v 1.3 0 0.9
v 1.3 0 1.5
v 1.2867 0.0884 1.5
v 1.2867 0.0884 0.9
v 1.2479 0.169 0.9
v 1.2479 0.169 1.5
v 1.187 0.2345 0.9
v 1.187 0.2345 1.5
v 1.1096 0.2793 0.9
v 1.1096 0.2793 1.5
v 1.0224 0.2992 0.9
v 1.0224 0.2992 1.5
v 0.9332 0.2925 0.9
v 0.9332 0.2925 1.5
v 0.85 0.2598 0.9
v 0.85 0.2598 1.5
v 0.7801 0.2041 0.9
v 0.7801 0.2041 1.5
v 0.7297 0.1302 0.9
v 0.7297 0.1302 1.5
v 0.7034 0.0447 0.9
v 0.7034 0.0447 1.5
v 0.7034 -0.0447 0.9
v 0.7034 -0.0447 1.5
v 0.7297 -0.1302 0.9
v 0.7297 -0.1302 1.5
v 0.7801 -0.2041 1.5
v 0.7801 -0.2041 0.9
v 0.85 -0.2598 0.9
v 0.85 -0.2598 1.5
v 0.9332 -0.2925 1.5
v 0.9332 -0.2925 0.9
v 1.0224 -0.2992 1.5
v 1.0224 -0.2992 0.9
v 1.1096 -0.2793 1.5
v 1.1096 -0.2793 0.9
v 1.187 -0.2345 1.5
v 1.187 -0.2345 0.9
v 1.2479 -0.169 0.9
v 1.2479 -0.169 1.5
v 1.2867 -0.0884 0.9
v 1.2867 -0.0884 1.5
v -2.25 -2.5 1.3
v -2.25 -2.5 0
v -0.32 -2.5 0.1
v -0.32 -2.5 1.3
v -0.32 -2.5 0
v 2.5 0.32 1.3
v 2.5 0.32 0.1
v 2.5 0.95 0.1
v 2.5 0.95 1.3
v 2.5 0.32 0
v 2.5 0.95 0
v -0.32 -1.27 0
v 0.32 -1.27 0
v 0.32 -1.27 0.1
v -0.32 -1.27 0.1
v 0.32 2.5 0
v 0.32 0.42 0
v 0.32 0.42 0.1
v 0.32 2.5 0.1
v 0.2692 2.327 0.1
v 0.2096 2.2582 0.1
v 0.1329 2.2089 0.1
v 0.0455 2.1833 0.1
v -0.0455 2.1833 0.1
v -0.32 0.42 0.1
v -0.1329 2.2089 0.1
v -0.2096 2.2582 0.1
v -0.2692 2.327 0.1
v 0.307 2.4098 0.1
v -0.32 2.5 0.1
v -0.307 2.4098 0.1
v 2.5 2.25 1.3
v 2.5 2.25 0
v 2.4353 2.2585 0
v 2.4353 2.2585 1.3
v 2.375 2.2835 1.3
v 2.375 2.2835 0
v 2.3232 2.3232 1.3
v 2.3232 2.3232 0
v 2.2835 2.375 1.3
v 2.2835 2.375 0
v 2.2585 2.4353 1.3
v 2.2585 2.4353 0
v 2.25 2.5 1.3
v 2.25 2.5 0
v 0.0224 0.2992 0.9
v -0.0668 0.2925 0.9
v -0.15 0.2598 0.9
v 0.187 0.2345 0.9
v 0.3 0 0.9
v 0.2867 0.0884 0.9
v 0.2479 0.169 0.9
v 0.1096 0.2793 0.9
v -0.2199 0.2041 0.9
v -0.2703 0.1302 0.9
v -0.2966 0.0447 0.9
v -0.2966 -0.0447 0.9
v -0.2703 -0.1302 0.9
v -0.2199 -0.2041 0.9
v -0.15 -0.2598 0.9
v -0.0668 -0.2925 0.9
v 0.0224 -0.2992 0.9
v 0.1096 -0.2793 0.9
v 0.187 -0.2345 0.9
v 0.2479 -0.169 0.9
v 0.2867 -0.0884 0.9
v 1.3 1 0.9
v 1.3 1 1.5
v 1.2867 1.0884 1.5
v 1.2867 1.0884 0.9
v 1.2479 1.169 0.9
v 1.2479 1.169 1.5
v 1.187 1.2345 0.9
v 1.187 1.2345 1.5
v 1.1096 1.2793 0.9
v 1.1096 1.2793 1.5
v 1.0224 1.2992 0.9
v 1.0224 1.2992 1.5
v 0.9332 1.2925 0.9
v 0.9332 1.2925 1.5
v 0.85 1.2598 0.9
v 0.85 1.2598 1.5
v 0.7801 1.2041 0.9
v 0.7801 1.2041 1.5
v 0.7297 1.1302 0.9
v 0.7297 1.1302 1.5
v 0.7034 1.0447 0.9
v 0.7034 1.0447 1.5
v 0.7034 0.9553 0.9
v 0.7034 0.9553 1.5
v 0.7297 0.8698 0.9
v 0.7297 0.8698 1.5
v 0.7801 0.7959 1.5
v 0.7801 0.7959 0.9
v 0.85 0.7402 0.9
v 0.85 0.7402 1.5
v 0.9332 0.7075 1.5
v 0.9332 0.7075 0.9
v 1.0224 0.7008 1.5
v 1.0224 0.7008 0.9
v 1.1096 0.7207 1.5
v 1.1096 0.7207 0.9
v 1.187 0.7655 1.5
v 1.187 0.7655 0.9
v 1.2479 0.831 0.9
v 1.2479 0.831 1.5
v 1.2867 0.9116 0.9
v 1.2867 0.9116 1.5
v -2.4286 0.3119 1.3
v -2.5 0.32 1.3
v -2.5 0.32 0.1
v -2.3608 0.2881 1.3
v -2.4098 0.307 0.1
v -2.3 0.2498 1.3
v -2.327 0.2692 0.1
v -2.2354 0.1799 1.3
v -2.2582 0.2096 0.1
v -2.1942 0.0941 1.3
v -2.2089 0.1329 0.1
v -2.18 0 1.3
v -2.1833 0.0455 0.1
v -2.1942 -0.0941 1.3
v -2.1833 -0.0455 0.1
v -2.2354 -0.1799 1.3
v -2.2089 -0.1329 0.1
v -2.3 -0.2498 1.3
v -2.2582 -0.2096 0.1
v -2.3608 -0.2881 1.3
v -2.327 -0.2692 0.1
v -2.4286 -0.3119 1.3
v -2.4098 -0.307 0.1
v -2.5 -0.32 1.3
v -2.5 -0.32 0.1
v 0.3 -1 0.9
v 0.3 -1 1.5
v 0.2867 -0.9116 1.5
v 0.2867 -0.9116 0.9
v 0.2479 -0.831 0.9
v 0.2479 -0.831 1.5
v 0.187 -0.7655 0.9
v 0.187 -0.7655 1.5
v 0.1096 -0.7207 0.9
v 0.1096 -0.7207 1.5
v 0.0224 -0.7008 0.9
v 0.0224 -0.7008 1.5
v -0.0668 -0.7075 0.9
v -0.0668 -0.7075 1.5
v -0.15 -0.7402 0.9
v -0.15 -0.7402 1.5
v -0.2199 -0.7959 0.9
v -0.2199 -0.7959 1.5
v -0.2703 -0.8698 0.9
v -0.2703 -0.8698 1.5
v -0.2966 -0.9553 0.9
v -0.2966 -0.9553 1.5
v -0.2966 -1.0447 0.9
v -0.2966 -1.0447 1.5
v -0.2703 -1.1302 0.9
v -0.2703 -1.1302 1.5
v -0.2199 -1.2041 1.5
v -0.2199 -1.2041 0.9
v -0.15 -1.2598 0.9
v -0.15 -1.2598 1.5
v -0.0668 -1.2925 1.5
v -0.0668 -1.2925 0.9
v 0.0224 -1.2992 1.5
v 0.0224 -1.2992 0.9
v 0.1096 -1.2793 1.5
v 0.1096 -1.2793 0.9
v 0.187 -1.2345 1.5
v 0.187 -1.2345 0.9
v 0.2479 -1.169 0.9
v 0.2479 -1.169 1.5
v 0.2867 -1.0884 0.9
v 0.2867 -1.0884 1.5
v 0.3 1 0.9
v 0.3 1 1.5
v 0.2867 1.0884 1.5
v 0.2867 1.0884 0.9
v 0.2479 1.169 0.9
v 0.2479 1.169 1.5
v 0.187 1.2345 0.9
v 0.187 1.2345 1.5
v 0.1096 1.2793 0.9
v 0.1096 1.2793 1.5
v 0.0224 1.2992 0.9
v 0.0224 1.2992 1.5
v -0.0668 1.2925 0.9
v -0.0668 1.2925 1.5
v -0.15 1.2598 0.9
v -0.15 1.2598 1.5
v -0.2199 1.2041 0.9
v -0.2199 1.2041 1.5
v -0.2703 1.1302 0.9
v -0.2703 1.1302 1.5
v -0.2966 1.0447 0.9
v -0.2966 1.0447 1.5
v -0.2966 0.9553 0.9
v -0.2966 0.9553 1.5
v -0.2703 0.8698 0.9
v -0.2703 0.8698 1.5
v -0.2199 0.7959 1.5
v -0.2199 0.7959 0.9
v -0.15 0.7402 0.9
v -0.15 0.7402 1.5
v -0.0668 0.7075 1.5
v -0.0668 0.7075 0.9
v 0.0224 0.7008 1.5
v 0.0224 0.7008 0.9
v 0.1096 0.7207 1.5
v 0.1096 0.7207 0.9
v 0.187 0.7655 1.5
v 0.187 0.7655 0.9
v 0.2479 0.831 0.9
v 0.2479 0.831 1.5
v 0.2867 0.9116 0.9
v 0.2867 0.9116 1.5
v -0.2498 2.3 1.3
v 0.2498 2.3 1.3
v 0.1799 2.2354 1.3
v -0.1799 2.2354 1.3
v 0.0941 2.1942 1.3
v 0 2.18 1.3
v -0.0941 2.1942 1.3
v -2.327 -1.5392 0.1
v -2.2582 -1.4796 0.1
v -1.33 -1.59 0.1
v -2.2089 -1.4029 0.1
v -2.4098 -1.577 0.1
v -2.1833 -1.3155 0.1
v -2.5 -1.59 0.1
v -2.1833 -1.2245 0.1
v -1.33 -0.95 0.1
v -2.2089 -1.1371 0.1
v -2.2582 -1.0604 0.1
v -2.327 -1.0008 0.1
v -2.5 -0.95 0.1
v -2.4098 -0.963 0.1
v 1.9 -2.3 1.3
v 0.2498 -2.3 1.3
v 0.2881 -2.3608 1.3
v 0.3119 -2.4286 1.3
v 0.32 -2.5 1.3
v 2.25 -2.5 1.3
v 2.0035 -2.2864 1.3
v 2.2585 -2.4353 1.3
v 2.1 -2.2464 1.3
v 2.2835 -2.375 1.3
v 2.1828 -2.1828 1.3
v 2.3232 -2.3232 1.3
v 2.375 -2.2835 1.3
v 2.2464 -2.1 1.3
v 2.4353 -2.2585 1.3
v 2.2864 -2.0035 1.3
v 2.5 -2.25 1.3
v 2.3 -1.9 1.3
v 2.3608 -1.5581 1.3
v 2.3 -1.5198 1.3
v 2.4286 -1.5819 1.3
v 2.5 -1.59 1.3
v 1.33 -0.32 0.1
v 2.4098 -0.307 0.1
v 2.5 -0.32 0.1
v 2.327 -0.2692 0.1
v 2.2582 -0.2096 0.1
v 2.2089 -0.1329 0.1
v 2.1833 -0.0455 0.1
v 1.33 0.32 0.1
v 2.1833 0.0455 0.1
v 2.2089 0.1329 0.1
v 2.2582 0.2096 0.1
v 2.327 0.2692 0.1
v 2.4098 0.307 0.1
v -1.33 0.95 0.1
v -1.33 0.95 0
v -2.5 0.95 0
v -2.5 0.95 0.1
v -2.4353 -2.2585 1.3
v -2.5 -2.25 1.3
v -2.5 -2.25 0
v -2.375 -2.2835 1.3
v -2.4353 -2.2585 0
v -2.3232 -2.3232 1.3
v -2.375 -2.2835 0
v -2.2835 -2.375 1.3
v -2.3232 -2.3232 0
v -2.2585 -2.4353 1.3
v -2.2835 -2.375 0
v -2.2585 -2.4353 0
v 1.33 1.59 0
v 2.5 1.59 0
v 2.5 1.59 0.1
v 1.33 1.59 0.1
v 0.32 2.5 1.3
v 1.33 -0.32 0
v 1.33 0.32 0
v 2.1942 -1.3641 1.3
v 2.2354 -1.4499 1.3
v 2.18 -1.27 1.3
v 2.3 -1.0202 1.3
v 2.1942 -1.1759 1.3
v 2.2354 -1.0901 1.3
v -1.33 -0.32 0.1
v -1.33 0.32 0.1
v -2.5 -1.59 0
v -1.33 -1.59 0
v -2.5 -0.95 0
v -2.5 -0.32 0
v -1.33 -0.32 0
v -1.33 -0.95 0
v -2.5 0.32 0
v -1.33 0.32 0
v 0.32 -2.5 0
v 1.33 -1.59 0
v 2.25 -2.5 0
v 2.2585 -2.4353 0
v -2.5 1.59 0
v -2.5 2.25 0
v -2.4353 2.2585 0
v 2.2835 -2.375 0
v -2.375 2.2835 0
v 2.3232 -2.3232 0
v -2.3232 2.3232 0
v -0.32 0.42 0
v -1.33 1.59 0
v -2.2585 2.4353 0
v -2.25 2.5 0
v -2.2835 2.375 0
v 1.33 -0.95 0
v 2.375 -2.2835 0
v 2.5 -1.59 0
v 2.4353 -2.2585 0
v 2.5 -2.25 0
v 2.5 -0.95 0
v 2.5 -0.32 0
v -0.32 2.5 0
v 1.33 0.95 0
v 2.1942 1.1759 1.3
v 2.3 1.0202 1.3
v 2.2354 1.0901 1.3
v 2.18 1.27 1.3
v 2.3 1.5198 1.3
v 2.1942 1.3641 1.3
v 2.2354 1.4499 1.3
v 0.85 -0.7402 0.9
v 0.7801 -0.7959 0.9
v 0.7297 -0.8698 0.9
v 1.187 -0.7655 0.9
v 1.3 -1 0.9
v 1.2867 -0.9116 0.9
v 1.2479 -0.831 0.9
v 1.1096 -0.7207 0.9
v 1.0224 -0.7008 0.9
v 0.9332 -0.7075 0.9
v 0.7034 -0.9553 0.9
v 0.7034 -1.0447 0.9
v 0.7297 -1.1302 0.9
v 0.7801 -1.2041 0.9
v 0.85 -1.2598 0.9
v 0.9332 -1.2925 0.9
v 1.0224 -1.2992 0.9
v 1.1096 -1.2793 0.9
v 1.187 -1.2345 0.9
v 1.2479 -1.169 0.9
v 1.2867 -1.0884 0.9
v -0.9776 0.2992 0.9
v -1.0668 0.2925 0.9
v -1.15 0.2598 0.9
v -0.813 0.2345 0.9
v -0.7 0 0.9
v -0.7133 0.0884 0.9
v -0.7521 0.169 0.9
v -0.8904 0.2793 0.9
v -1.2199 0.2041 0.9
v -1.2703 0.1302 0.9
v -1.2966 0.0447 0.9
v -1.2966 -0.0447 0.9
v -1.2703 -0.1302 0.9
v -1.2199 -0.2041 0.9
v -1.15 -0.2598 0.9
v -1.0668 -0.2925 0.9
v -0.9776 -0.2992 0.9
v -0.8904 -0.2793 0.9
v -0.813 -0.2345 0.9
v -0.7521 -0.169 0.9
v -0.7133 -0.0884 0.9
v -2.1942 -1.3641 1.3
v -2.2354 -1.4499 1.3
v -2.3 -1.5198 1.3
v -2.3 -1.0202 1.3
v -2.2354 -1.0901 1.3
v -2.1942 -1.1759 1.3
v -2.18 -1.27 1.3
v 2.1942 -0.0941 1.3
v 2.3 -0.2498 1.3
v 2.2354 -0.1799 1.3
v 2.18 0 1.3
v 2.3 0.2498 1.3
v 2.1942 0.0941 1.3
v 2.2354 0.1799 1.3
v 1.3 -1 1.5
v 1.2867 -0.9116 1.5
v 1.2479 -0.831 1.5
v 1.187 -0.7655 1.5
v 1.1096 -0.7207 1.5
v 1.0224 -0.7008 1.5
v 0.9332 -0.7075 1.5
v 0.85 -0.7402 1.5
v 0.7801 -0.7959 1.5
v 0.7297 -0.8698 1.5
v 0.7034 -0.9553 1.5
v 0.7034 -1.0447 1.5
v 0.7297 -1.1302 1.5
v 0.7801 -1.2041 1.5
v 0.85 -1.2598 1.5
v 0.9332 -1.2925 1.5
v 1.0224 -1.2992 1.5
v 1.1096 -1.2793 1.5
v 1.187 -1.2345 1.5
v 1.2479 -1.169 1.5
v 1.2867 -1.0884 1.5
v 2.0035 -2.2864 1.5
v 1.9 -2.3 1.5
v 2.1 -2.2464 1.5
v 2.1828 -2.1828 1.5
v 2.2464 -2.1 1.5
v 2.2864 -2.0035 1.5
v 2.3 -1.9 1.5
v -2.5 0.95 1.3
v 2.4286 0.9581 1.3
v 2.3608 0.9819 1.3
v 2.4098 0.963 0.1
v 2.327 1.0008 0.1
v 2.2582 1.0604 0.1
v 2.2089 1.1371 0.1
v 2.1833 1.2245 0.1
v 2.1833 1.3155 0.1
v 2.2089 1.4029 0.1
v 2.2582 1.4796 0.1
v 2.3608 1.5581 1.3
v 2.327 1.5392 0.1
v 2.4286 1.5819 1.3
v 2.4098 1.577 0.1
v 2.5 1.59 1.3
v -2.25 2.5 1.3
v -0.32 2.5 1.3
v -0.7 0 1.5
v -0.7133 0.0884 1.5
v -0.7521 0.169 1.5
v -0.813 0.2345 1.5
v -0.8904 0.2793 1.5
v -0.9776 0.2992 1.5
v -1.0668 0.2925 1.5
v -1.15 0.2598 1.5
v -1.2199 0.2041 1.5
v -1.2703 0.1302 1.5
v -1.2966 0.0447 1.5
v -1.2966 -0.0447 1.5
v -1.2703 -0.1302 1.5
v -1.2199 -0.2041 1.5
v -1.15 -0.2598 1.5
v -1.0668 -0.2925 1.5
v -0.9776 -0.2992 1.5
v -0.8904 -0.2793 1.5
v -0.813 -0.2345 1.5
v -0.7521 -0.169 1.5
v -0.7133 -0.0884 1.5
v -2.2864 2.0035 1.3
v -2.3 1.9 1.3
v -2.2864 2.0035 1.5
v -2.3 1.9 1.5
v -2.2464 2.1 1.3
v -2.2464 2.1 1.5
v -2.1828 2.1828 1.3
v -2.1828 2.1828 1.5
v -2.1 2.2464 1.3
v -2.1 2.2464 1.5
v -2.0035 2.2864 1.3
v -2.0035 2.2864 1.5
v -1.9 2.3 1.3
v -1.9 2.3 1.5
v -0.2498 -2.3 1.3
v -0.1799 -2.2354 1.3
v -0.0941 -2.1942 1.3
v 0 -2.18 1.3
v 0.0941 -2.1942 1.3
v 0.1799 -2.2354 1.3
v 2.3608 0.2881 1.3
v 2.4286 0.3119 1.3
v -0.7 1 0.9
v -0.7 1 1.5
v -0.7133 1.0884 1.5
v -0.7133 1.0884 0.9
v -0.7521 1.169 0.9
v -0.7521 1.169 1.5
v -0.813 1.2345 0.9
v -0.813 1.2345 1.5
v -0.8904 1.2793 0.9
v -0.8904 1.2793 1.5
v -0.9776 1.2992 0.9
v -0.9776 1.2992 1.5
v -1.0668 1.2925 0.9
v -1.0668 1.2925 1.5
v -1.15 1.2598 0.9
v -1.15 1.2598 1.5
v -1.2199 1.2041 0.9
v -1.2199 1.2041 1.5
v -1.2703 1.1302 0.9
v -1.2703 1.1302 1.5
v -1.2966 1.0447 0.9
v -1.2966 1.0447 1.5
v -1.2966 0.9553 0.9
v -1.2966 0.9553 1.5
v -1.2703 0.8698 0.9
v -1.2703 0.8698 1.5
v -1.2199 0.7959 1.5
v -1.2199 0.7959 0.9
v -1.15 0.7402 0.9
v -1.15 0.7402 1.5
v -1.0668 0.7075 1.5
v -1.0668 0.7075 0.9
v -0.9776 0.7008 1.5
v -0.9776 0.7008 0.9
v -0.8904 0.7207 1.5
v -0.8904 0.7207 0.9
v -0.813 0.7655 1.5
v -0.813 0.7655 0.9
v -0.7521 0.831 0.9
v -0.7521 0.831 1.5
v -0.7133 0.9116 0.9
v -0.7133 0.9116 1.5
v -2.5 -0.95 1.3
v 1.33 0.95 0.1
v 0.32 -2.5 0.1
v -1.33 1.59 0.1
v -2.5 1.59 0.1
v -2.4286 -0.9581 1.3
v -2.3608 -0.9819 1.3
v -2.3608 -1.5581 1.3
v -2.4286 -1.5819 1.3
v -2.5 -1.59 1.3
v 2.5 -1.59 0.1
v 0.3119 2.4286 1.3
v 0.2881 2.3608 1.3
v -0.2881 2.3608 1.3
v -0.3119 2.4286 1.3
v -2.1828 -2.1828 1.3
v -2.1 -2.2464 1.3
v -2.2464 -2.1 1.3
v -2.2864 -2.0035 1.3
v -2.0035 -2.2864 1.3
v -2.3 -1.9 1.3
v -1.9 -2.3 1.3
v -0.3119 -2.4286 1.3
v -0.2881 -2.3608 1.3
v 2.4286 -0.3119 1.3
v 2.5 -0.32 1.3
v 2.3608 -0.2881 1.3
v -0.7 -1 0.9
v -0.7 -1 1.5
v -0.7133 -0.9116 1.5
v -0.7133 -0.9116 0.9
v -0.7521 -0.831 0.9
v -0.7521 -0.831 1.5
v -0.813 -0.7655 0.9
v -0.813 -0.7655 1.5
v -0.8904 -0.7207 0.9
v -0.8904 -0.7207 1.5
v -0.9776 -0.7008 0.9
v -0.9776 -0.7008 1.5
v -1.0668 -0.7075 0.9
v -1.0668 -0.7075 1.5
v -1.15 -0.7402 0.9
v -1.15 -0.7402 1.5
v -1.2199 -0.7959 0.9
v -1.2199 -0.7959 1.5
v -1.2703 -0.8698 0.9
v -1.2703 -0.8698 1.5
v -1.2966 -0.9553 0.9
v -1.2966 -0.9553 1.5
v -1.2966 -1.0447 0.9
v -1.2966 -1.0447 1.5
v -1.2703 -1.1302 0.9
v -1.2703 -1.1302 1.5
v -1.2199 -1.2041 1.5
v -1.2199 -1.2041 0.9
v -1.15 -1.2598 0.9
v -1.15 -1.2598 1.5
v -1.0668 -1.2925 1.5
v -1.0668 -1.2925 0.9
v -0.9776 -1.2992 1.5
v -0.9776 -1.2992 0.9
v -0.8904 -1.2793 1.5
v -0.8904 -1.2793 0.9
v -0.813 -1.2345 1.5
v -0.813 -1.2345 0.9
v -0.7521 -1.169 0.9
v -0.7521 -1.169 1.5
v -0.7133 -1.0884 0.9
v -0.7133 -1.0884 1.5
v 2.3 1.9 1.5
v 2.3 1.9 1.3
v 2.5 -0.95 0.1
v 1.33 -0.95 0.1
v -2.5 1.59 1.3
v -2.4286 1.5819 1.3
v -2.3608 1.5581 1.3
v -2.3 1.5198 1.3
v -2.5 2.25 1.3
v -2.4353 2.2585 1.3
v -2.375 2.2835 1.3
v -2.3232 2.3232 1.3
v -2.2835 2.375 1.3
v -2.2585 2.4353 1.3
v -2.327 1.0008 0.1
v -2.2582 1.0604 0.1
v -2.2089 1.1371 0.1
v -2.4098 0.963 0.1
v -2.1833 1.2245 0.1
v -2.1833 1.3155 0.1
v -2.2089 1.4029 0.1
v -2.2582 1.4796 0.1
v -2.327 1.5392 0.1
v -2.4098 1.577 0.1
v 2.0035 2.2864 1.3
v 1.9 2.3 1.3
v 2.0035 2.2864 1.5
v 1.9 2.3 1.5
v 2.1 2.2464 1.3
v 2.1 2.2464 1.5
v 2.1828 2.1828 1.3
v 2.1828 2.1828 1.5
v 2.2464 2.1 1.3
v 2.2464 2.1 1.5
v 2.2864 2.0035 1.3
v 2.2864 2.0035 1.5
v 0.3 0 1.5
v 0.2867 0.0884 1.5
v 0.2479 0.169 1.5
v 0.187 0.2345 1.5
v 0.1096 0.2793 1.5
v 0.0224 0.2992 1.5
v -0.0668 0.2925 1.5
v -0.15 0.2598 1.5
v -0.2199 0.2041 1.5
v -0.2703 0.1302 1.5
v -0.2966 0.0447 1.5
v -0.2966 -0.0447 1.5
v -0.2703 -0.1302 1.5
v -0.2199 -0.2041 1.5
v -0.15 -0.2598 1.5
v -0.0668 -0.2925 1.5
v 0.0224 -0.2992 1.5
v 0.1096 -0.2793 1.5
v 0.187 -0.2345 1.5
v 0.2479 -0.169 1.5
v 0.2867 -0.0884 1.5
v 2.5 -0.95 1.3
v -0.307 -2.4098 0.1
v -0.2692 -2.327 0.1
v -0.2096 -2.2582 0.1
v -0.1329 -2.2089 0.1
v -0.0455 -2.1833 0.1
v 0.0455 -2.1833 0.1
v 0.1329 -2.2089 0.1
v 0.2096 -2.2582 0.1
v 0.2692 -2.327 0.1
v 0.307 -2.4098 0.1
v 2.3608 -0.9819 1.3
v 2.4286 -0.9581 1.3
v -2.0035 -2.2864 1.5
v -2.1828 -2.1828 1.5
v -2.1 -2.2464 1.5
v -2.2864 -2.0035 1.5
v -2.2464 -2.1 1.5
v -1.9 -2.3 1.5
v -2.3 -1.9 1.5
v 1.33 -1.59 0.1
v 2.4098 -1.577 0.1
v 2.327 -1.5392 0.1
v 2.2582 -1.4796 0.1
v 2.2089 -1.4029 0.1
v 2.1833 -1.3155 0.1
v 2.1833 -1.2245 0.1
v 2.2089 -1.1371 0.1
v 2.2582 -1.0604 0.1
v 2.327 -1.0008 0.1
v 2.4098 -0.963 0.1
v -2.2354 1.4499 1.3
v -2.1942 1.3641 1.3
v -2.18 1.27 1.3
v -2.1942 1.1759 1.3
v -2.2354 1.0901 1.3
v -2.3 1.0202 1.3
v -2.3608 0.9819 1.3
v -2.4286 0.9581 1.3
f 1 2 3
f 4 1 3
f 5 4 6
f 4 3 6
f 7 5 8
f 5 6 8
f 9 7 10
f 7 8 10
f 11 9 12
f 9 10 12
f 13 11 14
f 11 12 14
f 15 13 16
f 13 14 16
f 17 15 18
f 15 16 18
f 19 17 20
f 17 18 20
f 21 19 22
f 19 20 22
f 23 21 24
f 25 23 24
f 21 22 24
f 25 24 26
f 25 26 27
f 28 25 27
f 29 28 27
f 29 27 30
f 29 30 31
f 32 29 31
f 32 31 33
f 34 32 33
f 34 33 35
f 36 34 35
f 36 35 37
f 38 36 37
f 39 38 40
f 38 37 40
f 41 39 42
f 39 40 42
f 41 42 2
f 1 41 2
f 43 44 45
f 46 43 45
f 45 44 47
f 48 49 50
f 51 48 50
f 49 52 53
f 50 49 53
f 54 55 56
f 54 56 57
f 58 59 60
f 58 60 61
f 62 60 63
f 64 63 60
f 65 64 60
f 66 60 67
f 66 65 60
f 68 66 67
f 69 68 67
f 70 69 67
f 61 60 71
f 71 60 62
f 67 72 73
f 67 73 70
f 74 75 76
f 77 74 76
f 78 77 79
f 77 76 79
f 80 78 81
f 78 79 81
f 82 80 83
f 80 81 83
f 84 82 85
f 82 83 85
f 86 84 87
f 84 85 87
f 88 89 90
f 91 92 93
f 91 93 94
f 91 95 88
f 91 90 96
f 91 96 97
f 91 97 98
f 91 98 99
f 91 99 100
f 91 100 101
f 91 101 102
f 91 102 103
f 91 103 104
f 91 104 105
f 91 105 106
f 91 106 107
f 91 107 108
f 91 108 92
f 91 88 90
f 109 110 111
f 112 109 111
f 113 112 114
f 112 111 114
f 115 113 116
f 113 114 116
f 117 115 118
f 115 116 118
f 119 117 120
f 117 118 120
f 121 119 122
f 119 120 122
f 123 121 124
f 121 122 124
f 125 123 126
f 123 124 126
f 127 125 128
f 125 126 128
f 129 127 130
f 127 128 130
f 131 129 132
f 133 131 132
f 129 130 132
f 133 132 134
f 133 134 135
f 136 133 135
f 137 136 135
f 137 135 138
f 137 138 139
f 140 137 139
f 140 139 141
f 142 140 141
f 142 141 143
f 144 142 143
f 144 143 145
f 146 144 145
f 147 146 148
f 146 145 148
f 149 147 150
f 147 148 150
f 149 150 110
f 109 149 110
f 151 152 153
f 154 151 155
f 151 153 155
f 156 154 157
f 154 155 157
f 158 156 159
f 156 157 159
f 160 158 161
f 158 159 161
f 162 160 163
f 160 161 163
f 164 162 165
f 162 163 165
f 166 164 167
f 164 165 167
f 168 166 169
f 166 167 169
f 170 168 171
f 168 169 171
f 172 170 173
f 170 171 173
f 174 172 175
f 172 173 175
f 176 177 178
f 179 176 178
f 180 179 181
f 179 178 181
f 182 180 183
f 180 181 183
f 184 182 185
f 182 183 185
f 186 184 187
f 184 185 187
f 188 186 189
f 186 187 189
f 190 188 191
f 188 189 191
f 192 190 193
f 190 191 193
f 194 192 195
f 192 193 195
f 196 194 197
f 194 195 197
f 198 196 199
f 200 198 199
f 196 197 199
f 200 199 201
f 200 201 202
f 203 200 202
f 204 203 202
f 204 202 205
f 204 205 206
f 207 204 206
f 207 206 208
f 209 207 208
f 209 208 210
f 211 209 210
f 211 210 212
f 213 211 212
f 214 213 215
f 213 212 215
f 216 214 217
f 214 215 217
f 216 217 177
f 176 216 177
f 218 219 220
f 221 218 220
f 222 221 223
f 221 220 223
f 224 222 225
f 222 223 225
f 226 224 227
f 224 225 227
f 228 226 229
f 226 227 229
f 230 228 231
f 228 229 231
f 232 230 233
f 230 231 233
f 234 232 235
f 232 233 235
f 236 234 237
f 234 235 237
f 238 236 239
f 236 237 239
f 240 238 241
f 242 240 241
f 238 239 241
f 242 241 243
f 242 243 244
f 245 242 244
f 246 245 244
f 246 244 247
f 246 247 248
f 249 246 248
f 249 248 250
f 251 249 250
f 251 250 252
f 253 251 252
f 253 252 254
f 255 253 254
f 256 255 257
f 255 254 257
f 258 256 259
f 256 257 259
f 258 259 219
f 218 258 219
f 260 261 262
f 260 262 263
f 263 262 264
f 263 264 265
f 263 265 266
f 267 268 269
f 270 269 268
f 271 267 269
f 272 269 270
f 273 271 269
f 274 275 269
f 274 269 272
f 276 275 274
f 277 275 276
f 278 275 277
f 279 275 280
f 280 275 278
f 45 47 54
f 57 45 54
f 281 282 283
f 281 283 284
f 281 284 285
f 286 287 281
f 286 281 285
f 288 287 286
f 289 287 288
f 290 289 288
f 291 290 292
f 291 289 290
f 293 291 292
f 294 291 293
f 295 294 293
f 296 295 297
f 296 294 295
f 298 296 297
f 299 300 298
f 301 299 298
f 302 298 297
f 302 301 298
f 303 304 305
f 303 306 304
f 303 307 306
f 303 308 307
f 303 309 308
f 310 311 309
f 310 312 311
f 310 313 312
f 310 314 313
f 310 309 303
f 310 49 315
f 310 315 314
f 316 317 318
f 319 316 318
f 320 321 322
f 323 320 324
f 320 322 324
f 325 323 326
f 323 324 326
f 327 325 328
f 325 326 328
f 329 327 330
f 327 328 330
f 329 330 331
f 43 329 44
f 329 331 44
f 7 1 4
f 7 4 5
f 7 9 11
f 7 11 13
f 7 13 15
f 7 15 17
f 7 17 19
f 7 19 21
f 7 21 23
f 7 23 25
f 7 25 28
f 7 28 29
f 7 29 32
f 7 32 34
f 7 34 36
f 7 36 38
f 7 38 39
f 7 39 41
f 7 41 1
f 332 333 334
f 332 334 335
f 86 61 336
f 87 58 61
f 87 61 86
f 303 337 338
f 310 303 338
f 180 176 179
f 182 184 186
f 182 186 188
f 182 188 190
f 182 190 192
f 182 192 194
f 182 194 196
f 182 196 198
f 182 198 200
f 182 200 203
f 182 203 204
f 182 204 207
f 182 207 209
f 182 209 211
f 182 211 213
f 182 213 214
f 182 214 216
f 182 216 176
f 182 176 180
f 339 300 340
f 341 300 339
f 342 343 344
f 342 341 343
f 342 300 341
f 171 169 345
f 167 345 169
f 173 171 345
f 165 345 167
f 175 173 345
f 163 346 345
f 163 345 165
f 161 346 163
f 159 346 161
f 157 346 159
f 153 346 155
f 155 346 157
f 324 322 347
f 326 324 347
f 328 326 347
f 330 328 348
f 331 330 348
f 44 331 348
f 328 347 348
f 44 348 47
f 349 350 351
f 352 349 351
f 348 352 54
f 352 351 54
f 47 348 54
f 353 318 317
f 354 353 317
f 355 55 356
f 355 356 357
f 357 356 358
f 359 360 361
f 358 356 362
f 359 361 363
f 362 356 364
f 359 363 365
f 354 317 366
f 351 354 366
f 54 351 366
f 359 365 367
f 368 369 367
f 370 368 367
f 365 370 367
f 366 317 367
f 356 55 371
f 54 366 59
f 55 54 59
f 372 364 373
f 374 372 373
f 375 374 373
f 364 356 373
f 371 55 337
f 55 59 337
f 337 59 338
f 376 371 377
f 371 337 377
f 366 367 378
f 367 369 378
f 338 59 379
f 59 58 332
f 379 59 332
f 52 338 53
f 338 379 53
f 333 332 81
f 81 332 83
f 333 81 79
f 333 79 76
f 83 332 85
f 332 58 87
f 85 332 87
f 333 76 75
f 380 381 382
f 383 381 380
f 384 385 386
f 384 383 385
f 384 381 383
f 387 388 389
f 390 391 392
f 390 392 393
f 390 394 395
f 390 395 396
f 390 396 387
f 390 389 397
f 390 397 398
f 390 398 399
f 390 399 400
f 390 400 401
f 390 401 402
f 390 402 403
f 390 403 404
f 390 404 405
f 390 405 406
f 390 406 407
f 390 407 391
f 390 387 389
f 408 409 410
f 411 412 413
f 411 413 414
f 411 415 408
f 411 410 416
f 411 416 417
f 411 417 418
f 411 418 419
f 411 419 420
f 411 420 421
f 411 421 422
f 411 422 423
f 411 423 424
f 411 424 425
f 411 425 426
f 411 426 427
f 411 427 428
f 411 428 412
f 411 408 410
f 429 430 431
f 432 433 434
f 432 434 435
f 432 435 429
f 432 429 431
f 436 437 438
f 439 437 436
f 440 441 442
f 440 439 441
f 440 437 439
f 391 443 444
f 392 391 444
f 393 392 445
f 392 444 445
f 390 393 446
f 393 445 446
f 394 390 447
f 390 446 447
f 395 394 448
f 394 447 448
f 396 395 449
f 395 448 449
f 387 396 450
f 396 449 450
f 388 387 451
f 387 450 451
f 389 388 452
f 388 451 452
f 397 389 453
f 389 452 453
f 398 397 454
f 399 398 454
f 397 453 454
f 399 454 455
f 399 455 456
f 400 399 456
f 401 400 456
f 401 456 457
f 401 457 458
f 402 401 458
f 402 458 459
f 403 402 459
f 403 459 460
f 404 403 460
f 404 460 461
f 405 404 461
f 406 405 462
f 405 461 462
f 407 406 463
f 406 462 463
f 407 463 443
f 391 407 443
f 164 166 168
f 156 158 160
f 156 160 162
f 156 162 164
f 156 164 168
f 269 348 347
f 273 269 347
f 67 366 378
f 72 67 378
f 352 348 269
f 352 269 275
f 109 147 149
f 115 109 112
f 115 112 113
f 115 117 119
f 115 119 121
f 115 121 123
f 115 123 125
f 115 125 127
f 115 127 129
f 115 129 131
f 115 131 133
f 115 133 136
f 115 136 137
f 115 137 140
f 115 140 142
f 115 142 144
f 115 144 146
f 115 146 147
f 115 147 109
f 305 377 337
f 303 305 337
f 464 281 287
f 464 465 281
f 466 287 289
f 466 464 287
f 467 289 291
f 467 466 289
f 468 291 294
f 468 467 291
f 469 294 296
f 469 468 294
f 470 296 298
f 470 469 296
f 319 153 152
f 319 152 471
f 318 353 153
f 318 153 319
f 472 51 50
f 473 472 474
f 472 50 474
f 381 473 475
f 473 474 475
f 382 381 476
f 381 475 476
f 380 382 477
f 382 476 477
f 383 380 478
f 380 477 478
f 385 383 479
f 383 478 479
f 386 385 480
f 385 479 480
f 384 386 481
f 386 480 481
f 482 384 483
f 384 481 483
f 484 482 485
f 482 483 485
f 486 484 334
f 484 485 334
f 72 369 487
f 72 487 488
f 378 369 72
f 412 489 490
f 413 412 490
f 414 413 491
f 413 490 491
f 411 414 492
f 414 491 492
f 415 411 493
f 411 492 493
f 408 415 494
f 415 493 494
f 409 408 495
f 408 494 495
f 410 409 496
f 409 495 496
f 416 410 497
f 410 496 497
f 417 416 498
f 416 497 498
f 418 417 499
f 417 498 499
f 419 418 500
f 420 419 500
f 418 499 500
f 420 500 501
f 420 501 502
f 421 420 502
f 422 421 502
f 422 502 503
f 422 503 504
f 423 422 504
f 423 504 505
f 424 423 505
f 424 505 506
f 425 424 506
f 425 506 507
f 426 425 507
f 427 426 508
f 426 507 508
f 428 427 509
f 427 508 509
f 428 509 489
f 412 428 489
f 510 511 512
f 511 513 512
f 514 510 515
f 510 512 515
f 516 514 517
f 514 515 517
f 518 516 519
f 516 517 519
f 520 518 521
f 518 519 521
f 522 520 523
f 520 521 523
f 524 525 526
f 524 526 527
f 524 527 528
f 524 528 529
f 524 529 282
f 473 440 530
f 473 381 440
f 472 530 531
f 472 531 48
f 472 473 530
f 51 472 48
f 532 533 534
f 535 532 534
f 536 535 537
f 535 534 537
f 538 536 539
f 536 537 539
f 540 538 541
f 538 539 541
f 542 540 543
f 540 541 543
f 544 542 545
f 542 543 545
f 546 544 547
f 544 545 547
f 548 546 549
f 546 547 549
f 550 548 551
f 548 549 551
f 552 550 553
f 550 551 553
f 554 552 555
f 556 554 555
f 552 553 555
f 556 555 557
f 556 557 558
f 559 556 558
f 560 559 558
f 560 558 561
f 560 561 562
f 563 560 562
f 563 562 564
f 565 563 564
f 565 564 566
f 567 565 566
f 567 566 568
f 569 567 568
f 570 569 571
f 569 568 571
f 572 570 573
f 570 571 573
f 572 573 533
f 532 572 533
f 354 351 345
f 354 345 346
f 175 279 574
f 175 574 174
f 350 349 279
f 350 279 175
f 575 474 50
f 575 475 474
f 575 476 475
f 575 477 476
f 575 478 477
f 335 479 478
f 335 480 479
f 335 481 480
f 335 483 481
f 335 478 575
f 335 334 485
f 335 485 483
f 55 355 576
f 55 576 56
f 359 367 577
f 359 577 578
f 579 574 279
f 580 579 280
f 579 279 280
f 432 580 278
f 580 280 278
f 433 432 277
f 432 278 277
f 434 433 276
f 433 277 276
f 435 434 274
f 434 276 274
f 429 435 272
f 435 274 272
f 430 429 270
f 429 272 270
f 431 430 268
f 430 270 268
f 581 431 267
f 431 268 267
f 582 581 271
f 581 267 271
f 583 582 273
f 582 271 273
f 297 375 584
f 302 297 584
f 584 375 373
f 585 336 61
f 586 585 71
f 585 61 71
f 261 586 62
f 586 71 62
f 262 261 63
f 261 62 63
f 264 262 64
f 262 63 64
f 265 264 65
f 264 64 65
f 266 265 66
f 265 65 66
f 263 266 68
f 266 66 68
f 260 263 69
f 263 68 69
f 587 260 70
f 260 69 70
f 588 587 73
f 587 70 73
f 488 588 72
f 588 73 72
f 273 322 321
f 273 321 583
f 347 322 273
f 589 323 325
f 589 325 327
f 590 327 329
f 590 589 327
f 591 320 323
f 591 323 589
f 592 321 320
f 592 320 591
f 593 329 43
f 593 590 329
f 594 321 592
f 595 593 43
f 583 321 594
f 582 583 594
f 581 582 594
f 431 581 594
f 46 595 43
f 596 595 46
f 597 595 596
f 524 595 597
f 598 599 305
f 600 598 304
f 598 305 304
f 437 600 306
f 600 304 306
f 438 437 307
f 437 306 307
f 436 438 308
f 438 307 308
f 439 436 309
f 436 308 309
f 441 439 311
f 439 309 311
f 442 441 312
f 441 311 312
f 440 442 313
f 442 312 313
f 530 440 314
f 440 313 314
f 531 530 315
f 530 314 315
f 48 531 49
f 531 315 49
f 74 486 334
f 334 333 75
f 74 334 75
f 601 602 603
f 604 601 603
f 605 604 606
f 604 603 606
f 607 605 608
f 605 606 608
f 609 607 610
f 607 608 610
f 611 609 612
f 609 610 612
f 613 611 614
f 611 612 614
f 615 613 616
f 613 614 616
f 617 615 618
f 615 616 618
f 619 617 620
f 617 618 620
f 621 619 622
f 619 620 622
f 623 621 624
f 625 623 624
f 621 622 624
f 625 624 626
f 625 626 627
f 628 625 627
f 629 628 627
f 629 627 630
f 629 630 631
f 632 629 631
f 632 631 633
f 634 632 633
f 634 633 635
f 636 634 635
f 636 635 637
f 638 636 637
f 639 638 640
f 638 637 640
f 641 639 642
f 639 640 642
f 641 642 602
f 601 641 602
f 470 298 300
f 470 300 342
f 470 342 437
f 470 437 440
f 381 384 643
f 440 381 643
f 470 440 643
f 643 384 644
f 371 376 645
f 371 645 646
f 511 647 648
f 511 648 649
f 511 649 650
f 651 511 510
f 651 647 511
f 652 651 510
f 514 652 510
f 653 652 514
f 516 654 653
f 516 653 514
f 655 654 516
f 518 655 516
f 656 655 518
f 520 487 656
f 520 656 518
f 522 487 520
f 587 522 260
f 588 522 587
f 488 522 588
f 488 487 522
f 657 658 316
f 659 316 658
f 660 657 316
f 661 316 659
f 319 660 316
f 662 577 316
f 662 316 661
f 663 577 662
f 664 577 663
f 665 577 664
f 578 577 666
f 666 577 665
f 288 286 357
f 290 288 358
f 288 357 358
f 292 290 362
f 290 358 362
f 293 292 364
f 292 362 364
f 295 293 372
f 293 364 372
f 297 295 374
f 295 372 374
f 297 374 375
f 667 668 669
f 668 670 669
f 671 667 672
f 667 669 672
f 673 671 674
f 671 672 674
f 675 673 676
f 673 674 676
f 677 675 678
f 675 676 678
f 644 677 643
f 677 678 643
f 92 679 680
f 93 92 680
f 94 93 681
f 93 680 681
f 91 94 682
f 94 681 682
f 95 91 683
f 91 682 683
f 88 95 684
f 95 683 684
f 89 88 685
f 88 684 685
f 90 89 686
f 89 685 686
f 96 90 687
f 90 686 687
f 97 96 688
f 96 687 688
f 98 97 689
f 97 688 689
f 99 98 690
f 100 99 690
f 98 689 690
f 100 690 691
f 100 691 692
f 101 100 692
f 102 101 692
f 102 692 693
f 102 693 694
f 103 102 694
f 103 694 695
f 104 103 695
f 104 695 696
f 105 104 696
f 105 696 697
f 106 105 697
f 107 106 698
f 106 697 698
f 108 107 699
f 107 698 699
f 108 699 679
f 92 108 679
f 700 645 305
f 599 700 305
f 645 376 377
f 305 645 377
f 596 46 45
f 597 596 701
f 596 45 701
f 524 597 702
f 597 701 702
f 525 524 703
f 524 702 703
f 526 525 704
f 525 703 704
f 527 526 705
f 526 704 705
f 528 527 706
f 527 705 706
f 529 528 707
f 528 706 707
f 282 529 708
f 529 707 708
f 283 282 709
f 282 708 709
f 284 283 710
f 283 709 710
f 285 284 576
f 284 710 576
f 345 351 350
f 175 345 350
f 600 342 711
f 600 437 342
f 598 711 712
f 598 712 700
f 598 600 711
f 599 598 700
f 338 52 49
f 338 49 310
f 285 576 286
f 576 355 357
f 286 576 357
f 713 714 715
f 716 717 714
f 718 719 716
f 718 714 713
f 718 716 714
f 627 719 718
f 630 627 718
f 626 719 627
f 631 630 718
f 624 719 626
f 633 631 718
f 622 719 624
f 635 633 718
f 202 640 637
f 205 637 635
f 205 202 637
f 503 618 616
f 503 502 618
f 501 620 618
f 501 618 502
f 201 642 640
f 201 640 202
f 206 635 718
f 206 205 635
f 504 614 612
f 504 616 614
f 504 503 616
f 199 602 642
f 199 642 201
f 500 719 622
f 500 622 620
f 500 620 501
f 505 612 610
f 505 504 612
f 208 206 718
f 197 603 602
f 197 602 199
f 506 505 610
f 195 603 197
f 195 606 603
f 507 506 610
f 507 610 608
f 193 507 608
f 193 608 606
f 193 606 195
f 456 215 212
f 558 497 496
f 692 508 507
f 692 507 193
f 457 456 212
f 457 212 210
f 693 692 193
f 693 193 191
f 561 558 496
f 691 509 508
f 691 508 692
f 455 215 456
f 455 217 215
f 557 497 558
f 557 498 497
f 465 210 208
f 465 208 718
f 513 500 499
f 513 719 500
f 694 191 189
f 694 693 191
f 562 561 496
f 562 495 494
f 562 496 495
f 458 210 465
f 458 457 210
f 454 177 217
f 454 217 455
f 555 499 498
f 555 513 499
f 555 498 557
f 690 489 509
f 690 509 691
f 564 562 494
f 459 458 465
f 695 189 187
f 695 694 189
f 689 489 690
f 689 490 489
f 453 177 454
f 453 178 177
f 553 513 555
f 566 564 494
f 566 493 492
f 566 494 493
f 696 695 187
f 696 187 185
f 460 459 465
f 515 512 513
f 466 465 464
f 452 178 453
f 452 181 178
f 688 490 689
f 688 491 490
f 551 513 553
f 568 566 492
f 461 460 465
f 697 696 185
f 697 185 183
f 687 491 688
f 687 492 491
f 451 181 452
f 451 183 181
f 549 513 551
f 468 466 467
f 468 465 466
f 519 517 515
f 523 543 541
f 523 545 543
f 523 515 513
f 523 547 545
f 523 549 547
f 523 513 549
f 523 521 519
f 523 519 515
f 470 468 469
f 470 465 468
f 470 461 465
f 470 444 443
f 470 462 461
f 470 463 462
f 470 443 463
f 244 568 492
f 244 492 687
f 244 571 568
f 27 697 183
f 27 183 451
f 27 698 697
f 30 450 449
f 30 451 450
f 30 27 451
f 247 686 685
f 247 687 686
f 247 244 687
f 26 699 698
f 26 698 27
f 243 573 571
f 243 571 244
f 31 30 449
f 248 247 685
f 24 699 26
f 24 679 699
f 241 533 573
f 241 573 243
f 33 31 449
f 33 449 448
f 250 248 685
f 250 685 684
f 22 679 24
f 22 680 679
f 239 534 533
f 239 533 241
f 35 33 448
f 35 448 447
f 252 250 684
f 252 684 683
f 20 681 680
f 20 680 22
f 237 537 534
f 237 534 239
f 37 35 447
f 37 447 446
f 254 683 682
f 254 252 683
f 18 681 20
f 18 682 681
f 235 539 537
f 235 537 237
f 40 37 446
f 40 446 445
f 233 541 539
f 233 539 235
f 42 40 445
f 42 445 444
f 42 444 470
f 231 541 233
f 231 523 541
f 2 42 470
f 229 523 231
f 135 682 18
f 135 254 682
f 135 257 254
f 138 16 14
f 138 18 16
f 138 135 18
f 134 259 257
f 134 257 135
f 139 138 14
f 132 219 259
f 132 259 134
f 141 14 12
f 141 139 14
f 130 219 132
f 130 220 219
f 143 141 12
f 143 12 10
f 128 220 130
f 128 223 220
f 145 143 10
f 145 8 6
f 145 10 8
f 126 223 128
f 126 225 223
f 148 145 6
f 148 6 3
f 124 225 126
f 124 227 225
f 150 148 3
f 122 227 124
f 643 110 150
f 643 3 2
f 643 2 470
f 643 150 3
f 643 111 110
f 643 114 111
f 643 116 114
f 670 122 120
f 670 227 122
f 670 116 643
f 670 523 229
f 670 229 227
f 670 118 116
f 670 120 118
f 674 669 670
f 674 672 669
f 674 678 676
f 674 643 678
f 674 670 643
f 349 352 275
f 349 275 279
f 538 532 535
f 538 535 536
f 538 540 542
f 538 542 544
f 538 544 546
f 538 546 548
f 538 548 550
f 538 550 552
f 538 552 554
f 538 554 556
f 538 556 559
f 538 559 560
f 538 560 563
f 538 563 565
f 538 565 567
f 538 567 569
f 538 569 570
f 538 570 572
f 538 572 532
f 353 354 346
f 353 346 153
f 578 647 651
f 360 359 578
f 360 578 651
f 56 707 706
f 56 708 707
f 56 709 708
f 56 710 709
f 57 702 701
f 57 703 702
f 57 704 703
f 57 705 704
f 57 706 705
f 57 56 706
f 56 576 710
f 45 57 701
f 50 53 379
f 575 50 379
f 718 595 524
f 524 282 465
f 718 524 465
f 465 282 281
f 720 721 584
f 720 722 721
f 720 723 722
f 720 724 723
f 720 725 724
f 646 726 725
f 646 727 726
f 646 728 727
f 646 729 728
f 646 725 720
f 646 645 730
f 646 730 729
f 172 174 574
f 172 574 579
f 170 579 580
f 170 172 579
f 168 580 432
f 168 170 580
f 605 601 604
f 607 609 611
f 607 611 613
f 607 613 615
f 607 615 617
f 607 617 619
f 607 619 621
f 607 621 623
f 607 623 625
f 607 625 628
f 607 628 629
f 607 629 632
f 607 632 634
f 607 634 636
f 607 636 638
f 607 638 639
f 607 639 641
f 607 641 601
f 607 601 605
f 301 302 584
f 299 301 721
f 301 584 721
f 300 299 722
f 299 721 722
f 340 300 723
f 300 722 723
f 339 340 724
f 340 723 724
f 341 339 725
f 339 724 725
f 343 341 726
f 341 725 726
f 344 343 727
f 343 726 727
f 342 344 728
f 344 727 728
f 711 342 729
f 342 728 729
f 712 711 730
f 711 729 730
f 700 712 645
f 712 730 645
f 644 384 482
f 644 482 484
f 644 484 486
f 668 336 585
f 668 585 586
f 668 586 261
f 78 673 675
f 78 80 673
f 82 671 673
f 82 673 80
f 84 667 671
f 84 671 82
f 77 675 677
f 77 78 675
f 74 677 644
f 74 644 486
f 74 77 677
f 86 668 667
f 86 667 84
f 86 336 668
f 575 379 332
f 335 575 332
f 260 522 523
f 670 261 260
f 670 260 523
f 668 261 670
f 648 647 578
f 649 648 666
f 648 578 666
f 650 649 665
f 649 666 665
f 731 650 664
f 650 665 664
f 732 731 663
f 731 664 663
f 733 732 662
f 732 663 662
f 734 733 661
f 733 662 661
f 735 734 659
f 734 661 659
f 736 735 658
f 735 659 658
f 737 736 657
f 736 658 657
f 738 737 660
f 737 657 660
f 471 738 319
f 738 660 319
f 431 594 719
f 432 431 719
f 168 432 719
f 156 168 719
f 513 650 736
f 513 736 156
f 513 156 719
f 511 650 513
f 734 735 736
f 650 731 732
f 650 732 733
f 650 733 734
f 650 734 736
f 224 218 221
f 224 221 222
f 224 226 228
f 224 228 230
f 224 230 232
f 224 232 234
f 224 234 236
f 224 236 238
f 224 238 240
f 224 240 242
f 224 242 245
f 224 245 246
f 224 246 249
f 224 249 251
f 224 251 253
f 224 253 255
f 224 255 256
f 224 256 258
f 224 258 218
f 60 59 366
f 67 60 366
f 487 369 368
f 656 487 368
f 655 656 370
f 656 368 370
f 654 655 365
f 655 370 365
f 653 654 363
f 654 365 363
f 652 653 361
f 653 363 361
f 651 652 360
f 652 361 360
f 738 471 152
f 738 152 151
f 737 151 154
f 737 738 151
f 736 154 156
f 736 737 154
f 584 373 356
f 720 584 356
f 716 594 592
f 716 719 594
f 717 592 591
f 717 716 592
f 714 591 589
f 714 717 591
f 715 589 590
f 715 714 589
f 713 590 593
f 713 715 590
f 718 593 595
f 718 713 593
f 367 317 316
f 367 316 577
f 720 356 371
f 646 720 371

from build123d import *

# Parameters (mm, degrees)
SKETCH_1_W          = 5
SKETCH_1_H          = 5
EXTRUDE_1_DEPTH     = 1.3
SKETCH_2_W          = 4.6
SKETCH_2_H          = 4.6
EXTRUDE_2_DEPTH     = 0.2
SKETCH_3_R          = 0.3
CUT_EXTRUDE_2_DEPTH = 0.6
SKETCH_4_R          = 0.32
CUT_EXTRUDE_3_DEPTH = 1.3
SKETCH_5_R          = 0.25
CUT_EXTRUDE_4_DEPTH = 4.840572874
FILLET_1_R          = 0.4
SKETCH_8_W          = 1.17
SKETCH_8_H          = 0.64
SKETCH_8_W_2        = 0.64
SKETCH_8_H_2        = 1.23
SKETCH_8_H_3        = 2.08
CUT_EXTRUDE_5_DEPTH = 0.1


with BuildPart() as part:
    # Эскиз1 → Бобышка-Вытянуть1 (new body)
    with BuildSketch(Plane.XY):
        Rectangle(SKETCH_1_W, SKETCH_1_H)
    extrude(amount=EXTRUDE_1_DEPTH)

    # Эскиз2 → Бобышка-Вытянуть2 (add)
    with BuildSketch(Plane.XY.offset(1.3)):
        Rectangle(SKETCH_2_W, SKETCH_2_H)
    extrude(amount=EXTRUDE_2_DEPTH)

    # Эскиз3 → Вырез-Вытянуть2 (cut)
    with BuildSketch(Plane.XY.offset(1.5)):
        Circle(SKETCH_3_R)
        with Locations((1, 0)):
            Circle(SKETCH_3_R)
        with Locations((1, 1)):
            Circle(SKETCH_3_R)
        with Locations((0, 1)):
            Circle(SKETCH_3_R)
        with Locations((-1, 0)):
            Circle(SKETCH_3_R)
        with Locations((-1, 1)):
            Circle(SKETCH_3_R)
        with Locations((0, -1)):
            Circle(SKETCH_3_R)
        with Locations((1, -1)):
            Circle(SKETCH_3_R)
        with Locations((-1, -1)):
            Circle(SKETCH_3_R)
    extrude(amount=-CUT_EXTRUDE_2_DEPTH, mode=Mode.SUBTRACT)

    # Эскиз4 → Вырез-Вытянуть3 (cut)
    with BuildSketch(Plane(origin=(0, 0, 0), x_dir=(-1, 0, 0), z_dir=(0, 0, -1))):
        with Locations((-2.5, 0)):
            Circle(SKETCH_4_R)
        with Locations((2.5, 0)):
            Circle(SKETCH_4_R)
        with Locations((2.5, 1.27)):
            Circle(SKETCH_4_R)
        with Locations((-2.5, 1.27)):
            Circle(SKETCH_4_R)
        with Locations((-2.5, -1.27)):
            Circle(SKETCH_4_R)
        with Locations((2.5, -1.27)):
            Circle(SKETCH_4_R)
        with Locations((0, 2.5)):
            Circle(SKETCH_4_R)
        with Locations((0, -2.5)):
            Circle(SKETCH_4_R)
    extrude(amount=-CUT_EXTRUDE_3_DEPTH, mode=Mode.SUBTRACT)

    # Эскиз5 → Вырез-Вытянуть4 (cut, through all)
    with BuildSketch(Plane(origin=(0, 0, 0), x_dir=(-1, 0, 0), z_dir=(0, 0, -1))):
        with Locations((-2.5, 2.5)):
            Circle(SKETCH_5_R)
        with Locations((2.5, 2.5)):
            Circle(SKETCH_5_R)
        with Locations((2.5, -2.5)):
            Circle(SKETCH_5_R)
        with Locations((-2.5, -2.5)):
            Circle(SKETCH_5_R)
    extrude(amount=-CUT_EXTRUDE_4_DEPTH, mode=Mode.SUBTRACT)

    # Скругление1
    fillet_1_edges = [part.edges().sort_by_distance(p)[0] for p in [
        (-2.3, 2.3, 1.4),
        (-2.3, -2.3, 1.4),
        (2.3, -2.3, 1.4),
        (2.3, 2.3, 1.4),
    ]]
    fillet(fillet_1_edges, radius=FILLET_1_R)

    # Эскиз8 → Вырез-Вытянуть5 (cut)
    with BuildSketch(Plane(origin=(0, 0, 0), x_dir=(-1, 0, 0), z_dir=(0, 0, -1))):
        with Locations((-1.915, 1.27)):
            Rectangle(SKETCH_8_W, SKETCH_8_H)
        with Locations((-1.915, 0)):
            Rectangle(SKETCH_8_W, SKETCH_8_H)
        with Locations((-1.915, -1.27)):
            Rectangle(SKETCH_8_W, SKETCH_8_H)
        with Locations((1.915, -1.27)):
            Rectangle(SKETCH_8_W, SKETCH_8_H)
        with Locations((1.915, 0)):
            Rectangle(SKETCH_8_W, SKETCH_8_H)
        with Locations((1.915, 1.27)):
            Rectangle(SKETCH_8_W, SKETCH_8_H)
        with Locations((0, -1.885)):
            Rectangle(SKETCH_8_W_2, SKETCH_8_H_2)
        with Locations((0, 1.46)):
            Rectangle(SKETCH_8_W_2, SKETCH_8_H_3)
    extrude(amount=-CUT_EXTRUDE_5_DEPTH, mode=Mode.SUBTRACT)


solid = part.part
